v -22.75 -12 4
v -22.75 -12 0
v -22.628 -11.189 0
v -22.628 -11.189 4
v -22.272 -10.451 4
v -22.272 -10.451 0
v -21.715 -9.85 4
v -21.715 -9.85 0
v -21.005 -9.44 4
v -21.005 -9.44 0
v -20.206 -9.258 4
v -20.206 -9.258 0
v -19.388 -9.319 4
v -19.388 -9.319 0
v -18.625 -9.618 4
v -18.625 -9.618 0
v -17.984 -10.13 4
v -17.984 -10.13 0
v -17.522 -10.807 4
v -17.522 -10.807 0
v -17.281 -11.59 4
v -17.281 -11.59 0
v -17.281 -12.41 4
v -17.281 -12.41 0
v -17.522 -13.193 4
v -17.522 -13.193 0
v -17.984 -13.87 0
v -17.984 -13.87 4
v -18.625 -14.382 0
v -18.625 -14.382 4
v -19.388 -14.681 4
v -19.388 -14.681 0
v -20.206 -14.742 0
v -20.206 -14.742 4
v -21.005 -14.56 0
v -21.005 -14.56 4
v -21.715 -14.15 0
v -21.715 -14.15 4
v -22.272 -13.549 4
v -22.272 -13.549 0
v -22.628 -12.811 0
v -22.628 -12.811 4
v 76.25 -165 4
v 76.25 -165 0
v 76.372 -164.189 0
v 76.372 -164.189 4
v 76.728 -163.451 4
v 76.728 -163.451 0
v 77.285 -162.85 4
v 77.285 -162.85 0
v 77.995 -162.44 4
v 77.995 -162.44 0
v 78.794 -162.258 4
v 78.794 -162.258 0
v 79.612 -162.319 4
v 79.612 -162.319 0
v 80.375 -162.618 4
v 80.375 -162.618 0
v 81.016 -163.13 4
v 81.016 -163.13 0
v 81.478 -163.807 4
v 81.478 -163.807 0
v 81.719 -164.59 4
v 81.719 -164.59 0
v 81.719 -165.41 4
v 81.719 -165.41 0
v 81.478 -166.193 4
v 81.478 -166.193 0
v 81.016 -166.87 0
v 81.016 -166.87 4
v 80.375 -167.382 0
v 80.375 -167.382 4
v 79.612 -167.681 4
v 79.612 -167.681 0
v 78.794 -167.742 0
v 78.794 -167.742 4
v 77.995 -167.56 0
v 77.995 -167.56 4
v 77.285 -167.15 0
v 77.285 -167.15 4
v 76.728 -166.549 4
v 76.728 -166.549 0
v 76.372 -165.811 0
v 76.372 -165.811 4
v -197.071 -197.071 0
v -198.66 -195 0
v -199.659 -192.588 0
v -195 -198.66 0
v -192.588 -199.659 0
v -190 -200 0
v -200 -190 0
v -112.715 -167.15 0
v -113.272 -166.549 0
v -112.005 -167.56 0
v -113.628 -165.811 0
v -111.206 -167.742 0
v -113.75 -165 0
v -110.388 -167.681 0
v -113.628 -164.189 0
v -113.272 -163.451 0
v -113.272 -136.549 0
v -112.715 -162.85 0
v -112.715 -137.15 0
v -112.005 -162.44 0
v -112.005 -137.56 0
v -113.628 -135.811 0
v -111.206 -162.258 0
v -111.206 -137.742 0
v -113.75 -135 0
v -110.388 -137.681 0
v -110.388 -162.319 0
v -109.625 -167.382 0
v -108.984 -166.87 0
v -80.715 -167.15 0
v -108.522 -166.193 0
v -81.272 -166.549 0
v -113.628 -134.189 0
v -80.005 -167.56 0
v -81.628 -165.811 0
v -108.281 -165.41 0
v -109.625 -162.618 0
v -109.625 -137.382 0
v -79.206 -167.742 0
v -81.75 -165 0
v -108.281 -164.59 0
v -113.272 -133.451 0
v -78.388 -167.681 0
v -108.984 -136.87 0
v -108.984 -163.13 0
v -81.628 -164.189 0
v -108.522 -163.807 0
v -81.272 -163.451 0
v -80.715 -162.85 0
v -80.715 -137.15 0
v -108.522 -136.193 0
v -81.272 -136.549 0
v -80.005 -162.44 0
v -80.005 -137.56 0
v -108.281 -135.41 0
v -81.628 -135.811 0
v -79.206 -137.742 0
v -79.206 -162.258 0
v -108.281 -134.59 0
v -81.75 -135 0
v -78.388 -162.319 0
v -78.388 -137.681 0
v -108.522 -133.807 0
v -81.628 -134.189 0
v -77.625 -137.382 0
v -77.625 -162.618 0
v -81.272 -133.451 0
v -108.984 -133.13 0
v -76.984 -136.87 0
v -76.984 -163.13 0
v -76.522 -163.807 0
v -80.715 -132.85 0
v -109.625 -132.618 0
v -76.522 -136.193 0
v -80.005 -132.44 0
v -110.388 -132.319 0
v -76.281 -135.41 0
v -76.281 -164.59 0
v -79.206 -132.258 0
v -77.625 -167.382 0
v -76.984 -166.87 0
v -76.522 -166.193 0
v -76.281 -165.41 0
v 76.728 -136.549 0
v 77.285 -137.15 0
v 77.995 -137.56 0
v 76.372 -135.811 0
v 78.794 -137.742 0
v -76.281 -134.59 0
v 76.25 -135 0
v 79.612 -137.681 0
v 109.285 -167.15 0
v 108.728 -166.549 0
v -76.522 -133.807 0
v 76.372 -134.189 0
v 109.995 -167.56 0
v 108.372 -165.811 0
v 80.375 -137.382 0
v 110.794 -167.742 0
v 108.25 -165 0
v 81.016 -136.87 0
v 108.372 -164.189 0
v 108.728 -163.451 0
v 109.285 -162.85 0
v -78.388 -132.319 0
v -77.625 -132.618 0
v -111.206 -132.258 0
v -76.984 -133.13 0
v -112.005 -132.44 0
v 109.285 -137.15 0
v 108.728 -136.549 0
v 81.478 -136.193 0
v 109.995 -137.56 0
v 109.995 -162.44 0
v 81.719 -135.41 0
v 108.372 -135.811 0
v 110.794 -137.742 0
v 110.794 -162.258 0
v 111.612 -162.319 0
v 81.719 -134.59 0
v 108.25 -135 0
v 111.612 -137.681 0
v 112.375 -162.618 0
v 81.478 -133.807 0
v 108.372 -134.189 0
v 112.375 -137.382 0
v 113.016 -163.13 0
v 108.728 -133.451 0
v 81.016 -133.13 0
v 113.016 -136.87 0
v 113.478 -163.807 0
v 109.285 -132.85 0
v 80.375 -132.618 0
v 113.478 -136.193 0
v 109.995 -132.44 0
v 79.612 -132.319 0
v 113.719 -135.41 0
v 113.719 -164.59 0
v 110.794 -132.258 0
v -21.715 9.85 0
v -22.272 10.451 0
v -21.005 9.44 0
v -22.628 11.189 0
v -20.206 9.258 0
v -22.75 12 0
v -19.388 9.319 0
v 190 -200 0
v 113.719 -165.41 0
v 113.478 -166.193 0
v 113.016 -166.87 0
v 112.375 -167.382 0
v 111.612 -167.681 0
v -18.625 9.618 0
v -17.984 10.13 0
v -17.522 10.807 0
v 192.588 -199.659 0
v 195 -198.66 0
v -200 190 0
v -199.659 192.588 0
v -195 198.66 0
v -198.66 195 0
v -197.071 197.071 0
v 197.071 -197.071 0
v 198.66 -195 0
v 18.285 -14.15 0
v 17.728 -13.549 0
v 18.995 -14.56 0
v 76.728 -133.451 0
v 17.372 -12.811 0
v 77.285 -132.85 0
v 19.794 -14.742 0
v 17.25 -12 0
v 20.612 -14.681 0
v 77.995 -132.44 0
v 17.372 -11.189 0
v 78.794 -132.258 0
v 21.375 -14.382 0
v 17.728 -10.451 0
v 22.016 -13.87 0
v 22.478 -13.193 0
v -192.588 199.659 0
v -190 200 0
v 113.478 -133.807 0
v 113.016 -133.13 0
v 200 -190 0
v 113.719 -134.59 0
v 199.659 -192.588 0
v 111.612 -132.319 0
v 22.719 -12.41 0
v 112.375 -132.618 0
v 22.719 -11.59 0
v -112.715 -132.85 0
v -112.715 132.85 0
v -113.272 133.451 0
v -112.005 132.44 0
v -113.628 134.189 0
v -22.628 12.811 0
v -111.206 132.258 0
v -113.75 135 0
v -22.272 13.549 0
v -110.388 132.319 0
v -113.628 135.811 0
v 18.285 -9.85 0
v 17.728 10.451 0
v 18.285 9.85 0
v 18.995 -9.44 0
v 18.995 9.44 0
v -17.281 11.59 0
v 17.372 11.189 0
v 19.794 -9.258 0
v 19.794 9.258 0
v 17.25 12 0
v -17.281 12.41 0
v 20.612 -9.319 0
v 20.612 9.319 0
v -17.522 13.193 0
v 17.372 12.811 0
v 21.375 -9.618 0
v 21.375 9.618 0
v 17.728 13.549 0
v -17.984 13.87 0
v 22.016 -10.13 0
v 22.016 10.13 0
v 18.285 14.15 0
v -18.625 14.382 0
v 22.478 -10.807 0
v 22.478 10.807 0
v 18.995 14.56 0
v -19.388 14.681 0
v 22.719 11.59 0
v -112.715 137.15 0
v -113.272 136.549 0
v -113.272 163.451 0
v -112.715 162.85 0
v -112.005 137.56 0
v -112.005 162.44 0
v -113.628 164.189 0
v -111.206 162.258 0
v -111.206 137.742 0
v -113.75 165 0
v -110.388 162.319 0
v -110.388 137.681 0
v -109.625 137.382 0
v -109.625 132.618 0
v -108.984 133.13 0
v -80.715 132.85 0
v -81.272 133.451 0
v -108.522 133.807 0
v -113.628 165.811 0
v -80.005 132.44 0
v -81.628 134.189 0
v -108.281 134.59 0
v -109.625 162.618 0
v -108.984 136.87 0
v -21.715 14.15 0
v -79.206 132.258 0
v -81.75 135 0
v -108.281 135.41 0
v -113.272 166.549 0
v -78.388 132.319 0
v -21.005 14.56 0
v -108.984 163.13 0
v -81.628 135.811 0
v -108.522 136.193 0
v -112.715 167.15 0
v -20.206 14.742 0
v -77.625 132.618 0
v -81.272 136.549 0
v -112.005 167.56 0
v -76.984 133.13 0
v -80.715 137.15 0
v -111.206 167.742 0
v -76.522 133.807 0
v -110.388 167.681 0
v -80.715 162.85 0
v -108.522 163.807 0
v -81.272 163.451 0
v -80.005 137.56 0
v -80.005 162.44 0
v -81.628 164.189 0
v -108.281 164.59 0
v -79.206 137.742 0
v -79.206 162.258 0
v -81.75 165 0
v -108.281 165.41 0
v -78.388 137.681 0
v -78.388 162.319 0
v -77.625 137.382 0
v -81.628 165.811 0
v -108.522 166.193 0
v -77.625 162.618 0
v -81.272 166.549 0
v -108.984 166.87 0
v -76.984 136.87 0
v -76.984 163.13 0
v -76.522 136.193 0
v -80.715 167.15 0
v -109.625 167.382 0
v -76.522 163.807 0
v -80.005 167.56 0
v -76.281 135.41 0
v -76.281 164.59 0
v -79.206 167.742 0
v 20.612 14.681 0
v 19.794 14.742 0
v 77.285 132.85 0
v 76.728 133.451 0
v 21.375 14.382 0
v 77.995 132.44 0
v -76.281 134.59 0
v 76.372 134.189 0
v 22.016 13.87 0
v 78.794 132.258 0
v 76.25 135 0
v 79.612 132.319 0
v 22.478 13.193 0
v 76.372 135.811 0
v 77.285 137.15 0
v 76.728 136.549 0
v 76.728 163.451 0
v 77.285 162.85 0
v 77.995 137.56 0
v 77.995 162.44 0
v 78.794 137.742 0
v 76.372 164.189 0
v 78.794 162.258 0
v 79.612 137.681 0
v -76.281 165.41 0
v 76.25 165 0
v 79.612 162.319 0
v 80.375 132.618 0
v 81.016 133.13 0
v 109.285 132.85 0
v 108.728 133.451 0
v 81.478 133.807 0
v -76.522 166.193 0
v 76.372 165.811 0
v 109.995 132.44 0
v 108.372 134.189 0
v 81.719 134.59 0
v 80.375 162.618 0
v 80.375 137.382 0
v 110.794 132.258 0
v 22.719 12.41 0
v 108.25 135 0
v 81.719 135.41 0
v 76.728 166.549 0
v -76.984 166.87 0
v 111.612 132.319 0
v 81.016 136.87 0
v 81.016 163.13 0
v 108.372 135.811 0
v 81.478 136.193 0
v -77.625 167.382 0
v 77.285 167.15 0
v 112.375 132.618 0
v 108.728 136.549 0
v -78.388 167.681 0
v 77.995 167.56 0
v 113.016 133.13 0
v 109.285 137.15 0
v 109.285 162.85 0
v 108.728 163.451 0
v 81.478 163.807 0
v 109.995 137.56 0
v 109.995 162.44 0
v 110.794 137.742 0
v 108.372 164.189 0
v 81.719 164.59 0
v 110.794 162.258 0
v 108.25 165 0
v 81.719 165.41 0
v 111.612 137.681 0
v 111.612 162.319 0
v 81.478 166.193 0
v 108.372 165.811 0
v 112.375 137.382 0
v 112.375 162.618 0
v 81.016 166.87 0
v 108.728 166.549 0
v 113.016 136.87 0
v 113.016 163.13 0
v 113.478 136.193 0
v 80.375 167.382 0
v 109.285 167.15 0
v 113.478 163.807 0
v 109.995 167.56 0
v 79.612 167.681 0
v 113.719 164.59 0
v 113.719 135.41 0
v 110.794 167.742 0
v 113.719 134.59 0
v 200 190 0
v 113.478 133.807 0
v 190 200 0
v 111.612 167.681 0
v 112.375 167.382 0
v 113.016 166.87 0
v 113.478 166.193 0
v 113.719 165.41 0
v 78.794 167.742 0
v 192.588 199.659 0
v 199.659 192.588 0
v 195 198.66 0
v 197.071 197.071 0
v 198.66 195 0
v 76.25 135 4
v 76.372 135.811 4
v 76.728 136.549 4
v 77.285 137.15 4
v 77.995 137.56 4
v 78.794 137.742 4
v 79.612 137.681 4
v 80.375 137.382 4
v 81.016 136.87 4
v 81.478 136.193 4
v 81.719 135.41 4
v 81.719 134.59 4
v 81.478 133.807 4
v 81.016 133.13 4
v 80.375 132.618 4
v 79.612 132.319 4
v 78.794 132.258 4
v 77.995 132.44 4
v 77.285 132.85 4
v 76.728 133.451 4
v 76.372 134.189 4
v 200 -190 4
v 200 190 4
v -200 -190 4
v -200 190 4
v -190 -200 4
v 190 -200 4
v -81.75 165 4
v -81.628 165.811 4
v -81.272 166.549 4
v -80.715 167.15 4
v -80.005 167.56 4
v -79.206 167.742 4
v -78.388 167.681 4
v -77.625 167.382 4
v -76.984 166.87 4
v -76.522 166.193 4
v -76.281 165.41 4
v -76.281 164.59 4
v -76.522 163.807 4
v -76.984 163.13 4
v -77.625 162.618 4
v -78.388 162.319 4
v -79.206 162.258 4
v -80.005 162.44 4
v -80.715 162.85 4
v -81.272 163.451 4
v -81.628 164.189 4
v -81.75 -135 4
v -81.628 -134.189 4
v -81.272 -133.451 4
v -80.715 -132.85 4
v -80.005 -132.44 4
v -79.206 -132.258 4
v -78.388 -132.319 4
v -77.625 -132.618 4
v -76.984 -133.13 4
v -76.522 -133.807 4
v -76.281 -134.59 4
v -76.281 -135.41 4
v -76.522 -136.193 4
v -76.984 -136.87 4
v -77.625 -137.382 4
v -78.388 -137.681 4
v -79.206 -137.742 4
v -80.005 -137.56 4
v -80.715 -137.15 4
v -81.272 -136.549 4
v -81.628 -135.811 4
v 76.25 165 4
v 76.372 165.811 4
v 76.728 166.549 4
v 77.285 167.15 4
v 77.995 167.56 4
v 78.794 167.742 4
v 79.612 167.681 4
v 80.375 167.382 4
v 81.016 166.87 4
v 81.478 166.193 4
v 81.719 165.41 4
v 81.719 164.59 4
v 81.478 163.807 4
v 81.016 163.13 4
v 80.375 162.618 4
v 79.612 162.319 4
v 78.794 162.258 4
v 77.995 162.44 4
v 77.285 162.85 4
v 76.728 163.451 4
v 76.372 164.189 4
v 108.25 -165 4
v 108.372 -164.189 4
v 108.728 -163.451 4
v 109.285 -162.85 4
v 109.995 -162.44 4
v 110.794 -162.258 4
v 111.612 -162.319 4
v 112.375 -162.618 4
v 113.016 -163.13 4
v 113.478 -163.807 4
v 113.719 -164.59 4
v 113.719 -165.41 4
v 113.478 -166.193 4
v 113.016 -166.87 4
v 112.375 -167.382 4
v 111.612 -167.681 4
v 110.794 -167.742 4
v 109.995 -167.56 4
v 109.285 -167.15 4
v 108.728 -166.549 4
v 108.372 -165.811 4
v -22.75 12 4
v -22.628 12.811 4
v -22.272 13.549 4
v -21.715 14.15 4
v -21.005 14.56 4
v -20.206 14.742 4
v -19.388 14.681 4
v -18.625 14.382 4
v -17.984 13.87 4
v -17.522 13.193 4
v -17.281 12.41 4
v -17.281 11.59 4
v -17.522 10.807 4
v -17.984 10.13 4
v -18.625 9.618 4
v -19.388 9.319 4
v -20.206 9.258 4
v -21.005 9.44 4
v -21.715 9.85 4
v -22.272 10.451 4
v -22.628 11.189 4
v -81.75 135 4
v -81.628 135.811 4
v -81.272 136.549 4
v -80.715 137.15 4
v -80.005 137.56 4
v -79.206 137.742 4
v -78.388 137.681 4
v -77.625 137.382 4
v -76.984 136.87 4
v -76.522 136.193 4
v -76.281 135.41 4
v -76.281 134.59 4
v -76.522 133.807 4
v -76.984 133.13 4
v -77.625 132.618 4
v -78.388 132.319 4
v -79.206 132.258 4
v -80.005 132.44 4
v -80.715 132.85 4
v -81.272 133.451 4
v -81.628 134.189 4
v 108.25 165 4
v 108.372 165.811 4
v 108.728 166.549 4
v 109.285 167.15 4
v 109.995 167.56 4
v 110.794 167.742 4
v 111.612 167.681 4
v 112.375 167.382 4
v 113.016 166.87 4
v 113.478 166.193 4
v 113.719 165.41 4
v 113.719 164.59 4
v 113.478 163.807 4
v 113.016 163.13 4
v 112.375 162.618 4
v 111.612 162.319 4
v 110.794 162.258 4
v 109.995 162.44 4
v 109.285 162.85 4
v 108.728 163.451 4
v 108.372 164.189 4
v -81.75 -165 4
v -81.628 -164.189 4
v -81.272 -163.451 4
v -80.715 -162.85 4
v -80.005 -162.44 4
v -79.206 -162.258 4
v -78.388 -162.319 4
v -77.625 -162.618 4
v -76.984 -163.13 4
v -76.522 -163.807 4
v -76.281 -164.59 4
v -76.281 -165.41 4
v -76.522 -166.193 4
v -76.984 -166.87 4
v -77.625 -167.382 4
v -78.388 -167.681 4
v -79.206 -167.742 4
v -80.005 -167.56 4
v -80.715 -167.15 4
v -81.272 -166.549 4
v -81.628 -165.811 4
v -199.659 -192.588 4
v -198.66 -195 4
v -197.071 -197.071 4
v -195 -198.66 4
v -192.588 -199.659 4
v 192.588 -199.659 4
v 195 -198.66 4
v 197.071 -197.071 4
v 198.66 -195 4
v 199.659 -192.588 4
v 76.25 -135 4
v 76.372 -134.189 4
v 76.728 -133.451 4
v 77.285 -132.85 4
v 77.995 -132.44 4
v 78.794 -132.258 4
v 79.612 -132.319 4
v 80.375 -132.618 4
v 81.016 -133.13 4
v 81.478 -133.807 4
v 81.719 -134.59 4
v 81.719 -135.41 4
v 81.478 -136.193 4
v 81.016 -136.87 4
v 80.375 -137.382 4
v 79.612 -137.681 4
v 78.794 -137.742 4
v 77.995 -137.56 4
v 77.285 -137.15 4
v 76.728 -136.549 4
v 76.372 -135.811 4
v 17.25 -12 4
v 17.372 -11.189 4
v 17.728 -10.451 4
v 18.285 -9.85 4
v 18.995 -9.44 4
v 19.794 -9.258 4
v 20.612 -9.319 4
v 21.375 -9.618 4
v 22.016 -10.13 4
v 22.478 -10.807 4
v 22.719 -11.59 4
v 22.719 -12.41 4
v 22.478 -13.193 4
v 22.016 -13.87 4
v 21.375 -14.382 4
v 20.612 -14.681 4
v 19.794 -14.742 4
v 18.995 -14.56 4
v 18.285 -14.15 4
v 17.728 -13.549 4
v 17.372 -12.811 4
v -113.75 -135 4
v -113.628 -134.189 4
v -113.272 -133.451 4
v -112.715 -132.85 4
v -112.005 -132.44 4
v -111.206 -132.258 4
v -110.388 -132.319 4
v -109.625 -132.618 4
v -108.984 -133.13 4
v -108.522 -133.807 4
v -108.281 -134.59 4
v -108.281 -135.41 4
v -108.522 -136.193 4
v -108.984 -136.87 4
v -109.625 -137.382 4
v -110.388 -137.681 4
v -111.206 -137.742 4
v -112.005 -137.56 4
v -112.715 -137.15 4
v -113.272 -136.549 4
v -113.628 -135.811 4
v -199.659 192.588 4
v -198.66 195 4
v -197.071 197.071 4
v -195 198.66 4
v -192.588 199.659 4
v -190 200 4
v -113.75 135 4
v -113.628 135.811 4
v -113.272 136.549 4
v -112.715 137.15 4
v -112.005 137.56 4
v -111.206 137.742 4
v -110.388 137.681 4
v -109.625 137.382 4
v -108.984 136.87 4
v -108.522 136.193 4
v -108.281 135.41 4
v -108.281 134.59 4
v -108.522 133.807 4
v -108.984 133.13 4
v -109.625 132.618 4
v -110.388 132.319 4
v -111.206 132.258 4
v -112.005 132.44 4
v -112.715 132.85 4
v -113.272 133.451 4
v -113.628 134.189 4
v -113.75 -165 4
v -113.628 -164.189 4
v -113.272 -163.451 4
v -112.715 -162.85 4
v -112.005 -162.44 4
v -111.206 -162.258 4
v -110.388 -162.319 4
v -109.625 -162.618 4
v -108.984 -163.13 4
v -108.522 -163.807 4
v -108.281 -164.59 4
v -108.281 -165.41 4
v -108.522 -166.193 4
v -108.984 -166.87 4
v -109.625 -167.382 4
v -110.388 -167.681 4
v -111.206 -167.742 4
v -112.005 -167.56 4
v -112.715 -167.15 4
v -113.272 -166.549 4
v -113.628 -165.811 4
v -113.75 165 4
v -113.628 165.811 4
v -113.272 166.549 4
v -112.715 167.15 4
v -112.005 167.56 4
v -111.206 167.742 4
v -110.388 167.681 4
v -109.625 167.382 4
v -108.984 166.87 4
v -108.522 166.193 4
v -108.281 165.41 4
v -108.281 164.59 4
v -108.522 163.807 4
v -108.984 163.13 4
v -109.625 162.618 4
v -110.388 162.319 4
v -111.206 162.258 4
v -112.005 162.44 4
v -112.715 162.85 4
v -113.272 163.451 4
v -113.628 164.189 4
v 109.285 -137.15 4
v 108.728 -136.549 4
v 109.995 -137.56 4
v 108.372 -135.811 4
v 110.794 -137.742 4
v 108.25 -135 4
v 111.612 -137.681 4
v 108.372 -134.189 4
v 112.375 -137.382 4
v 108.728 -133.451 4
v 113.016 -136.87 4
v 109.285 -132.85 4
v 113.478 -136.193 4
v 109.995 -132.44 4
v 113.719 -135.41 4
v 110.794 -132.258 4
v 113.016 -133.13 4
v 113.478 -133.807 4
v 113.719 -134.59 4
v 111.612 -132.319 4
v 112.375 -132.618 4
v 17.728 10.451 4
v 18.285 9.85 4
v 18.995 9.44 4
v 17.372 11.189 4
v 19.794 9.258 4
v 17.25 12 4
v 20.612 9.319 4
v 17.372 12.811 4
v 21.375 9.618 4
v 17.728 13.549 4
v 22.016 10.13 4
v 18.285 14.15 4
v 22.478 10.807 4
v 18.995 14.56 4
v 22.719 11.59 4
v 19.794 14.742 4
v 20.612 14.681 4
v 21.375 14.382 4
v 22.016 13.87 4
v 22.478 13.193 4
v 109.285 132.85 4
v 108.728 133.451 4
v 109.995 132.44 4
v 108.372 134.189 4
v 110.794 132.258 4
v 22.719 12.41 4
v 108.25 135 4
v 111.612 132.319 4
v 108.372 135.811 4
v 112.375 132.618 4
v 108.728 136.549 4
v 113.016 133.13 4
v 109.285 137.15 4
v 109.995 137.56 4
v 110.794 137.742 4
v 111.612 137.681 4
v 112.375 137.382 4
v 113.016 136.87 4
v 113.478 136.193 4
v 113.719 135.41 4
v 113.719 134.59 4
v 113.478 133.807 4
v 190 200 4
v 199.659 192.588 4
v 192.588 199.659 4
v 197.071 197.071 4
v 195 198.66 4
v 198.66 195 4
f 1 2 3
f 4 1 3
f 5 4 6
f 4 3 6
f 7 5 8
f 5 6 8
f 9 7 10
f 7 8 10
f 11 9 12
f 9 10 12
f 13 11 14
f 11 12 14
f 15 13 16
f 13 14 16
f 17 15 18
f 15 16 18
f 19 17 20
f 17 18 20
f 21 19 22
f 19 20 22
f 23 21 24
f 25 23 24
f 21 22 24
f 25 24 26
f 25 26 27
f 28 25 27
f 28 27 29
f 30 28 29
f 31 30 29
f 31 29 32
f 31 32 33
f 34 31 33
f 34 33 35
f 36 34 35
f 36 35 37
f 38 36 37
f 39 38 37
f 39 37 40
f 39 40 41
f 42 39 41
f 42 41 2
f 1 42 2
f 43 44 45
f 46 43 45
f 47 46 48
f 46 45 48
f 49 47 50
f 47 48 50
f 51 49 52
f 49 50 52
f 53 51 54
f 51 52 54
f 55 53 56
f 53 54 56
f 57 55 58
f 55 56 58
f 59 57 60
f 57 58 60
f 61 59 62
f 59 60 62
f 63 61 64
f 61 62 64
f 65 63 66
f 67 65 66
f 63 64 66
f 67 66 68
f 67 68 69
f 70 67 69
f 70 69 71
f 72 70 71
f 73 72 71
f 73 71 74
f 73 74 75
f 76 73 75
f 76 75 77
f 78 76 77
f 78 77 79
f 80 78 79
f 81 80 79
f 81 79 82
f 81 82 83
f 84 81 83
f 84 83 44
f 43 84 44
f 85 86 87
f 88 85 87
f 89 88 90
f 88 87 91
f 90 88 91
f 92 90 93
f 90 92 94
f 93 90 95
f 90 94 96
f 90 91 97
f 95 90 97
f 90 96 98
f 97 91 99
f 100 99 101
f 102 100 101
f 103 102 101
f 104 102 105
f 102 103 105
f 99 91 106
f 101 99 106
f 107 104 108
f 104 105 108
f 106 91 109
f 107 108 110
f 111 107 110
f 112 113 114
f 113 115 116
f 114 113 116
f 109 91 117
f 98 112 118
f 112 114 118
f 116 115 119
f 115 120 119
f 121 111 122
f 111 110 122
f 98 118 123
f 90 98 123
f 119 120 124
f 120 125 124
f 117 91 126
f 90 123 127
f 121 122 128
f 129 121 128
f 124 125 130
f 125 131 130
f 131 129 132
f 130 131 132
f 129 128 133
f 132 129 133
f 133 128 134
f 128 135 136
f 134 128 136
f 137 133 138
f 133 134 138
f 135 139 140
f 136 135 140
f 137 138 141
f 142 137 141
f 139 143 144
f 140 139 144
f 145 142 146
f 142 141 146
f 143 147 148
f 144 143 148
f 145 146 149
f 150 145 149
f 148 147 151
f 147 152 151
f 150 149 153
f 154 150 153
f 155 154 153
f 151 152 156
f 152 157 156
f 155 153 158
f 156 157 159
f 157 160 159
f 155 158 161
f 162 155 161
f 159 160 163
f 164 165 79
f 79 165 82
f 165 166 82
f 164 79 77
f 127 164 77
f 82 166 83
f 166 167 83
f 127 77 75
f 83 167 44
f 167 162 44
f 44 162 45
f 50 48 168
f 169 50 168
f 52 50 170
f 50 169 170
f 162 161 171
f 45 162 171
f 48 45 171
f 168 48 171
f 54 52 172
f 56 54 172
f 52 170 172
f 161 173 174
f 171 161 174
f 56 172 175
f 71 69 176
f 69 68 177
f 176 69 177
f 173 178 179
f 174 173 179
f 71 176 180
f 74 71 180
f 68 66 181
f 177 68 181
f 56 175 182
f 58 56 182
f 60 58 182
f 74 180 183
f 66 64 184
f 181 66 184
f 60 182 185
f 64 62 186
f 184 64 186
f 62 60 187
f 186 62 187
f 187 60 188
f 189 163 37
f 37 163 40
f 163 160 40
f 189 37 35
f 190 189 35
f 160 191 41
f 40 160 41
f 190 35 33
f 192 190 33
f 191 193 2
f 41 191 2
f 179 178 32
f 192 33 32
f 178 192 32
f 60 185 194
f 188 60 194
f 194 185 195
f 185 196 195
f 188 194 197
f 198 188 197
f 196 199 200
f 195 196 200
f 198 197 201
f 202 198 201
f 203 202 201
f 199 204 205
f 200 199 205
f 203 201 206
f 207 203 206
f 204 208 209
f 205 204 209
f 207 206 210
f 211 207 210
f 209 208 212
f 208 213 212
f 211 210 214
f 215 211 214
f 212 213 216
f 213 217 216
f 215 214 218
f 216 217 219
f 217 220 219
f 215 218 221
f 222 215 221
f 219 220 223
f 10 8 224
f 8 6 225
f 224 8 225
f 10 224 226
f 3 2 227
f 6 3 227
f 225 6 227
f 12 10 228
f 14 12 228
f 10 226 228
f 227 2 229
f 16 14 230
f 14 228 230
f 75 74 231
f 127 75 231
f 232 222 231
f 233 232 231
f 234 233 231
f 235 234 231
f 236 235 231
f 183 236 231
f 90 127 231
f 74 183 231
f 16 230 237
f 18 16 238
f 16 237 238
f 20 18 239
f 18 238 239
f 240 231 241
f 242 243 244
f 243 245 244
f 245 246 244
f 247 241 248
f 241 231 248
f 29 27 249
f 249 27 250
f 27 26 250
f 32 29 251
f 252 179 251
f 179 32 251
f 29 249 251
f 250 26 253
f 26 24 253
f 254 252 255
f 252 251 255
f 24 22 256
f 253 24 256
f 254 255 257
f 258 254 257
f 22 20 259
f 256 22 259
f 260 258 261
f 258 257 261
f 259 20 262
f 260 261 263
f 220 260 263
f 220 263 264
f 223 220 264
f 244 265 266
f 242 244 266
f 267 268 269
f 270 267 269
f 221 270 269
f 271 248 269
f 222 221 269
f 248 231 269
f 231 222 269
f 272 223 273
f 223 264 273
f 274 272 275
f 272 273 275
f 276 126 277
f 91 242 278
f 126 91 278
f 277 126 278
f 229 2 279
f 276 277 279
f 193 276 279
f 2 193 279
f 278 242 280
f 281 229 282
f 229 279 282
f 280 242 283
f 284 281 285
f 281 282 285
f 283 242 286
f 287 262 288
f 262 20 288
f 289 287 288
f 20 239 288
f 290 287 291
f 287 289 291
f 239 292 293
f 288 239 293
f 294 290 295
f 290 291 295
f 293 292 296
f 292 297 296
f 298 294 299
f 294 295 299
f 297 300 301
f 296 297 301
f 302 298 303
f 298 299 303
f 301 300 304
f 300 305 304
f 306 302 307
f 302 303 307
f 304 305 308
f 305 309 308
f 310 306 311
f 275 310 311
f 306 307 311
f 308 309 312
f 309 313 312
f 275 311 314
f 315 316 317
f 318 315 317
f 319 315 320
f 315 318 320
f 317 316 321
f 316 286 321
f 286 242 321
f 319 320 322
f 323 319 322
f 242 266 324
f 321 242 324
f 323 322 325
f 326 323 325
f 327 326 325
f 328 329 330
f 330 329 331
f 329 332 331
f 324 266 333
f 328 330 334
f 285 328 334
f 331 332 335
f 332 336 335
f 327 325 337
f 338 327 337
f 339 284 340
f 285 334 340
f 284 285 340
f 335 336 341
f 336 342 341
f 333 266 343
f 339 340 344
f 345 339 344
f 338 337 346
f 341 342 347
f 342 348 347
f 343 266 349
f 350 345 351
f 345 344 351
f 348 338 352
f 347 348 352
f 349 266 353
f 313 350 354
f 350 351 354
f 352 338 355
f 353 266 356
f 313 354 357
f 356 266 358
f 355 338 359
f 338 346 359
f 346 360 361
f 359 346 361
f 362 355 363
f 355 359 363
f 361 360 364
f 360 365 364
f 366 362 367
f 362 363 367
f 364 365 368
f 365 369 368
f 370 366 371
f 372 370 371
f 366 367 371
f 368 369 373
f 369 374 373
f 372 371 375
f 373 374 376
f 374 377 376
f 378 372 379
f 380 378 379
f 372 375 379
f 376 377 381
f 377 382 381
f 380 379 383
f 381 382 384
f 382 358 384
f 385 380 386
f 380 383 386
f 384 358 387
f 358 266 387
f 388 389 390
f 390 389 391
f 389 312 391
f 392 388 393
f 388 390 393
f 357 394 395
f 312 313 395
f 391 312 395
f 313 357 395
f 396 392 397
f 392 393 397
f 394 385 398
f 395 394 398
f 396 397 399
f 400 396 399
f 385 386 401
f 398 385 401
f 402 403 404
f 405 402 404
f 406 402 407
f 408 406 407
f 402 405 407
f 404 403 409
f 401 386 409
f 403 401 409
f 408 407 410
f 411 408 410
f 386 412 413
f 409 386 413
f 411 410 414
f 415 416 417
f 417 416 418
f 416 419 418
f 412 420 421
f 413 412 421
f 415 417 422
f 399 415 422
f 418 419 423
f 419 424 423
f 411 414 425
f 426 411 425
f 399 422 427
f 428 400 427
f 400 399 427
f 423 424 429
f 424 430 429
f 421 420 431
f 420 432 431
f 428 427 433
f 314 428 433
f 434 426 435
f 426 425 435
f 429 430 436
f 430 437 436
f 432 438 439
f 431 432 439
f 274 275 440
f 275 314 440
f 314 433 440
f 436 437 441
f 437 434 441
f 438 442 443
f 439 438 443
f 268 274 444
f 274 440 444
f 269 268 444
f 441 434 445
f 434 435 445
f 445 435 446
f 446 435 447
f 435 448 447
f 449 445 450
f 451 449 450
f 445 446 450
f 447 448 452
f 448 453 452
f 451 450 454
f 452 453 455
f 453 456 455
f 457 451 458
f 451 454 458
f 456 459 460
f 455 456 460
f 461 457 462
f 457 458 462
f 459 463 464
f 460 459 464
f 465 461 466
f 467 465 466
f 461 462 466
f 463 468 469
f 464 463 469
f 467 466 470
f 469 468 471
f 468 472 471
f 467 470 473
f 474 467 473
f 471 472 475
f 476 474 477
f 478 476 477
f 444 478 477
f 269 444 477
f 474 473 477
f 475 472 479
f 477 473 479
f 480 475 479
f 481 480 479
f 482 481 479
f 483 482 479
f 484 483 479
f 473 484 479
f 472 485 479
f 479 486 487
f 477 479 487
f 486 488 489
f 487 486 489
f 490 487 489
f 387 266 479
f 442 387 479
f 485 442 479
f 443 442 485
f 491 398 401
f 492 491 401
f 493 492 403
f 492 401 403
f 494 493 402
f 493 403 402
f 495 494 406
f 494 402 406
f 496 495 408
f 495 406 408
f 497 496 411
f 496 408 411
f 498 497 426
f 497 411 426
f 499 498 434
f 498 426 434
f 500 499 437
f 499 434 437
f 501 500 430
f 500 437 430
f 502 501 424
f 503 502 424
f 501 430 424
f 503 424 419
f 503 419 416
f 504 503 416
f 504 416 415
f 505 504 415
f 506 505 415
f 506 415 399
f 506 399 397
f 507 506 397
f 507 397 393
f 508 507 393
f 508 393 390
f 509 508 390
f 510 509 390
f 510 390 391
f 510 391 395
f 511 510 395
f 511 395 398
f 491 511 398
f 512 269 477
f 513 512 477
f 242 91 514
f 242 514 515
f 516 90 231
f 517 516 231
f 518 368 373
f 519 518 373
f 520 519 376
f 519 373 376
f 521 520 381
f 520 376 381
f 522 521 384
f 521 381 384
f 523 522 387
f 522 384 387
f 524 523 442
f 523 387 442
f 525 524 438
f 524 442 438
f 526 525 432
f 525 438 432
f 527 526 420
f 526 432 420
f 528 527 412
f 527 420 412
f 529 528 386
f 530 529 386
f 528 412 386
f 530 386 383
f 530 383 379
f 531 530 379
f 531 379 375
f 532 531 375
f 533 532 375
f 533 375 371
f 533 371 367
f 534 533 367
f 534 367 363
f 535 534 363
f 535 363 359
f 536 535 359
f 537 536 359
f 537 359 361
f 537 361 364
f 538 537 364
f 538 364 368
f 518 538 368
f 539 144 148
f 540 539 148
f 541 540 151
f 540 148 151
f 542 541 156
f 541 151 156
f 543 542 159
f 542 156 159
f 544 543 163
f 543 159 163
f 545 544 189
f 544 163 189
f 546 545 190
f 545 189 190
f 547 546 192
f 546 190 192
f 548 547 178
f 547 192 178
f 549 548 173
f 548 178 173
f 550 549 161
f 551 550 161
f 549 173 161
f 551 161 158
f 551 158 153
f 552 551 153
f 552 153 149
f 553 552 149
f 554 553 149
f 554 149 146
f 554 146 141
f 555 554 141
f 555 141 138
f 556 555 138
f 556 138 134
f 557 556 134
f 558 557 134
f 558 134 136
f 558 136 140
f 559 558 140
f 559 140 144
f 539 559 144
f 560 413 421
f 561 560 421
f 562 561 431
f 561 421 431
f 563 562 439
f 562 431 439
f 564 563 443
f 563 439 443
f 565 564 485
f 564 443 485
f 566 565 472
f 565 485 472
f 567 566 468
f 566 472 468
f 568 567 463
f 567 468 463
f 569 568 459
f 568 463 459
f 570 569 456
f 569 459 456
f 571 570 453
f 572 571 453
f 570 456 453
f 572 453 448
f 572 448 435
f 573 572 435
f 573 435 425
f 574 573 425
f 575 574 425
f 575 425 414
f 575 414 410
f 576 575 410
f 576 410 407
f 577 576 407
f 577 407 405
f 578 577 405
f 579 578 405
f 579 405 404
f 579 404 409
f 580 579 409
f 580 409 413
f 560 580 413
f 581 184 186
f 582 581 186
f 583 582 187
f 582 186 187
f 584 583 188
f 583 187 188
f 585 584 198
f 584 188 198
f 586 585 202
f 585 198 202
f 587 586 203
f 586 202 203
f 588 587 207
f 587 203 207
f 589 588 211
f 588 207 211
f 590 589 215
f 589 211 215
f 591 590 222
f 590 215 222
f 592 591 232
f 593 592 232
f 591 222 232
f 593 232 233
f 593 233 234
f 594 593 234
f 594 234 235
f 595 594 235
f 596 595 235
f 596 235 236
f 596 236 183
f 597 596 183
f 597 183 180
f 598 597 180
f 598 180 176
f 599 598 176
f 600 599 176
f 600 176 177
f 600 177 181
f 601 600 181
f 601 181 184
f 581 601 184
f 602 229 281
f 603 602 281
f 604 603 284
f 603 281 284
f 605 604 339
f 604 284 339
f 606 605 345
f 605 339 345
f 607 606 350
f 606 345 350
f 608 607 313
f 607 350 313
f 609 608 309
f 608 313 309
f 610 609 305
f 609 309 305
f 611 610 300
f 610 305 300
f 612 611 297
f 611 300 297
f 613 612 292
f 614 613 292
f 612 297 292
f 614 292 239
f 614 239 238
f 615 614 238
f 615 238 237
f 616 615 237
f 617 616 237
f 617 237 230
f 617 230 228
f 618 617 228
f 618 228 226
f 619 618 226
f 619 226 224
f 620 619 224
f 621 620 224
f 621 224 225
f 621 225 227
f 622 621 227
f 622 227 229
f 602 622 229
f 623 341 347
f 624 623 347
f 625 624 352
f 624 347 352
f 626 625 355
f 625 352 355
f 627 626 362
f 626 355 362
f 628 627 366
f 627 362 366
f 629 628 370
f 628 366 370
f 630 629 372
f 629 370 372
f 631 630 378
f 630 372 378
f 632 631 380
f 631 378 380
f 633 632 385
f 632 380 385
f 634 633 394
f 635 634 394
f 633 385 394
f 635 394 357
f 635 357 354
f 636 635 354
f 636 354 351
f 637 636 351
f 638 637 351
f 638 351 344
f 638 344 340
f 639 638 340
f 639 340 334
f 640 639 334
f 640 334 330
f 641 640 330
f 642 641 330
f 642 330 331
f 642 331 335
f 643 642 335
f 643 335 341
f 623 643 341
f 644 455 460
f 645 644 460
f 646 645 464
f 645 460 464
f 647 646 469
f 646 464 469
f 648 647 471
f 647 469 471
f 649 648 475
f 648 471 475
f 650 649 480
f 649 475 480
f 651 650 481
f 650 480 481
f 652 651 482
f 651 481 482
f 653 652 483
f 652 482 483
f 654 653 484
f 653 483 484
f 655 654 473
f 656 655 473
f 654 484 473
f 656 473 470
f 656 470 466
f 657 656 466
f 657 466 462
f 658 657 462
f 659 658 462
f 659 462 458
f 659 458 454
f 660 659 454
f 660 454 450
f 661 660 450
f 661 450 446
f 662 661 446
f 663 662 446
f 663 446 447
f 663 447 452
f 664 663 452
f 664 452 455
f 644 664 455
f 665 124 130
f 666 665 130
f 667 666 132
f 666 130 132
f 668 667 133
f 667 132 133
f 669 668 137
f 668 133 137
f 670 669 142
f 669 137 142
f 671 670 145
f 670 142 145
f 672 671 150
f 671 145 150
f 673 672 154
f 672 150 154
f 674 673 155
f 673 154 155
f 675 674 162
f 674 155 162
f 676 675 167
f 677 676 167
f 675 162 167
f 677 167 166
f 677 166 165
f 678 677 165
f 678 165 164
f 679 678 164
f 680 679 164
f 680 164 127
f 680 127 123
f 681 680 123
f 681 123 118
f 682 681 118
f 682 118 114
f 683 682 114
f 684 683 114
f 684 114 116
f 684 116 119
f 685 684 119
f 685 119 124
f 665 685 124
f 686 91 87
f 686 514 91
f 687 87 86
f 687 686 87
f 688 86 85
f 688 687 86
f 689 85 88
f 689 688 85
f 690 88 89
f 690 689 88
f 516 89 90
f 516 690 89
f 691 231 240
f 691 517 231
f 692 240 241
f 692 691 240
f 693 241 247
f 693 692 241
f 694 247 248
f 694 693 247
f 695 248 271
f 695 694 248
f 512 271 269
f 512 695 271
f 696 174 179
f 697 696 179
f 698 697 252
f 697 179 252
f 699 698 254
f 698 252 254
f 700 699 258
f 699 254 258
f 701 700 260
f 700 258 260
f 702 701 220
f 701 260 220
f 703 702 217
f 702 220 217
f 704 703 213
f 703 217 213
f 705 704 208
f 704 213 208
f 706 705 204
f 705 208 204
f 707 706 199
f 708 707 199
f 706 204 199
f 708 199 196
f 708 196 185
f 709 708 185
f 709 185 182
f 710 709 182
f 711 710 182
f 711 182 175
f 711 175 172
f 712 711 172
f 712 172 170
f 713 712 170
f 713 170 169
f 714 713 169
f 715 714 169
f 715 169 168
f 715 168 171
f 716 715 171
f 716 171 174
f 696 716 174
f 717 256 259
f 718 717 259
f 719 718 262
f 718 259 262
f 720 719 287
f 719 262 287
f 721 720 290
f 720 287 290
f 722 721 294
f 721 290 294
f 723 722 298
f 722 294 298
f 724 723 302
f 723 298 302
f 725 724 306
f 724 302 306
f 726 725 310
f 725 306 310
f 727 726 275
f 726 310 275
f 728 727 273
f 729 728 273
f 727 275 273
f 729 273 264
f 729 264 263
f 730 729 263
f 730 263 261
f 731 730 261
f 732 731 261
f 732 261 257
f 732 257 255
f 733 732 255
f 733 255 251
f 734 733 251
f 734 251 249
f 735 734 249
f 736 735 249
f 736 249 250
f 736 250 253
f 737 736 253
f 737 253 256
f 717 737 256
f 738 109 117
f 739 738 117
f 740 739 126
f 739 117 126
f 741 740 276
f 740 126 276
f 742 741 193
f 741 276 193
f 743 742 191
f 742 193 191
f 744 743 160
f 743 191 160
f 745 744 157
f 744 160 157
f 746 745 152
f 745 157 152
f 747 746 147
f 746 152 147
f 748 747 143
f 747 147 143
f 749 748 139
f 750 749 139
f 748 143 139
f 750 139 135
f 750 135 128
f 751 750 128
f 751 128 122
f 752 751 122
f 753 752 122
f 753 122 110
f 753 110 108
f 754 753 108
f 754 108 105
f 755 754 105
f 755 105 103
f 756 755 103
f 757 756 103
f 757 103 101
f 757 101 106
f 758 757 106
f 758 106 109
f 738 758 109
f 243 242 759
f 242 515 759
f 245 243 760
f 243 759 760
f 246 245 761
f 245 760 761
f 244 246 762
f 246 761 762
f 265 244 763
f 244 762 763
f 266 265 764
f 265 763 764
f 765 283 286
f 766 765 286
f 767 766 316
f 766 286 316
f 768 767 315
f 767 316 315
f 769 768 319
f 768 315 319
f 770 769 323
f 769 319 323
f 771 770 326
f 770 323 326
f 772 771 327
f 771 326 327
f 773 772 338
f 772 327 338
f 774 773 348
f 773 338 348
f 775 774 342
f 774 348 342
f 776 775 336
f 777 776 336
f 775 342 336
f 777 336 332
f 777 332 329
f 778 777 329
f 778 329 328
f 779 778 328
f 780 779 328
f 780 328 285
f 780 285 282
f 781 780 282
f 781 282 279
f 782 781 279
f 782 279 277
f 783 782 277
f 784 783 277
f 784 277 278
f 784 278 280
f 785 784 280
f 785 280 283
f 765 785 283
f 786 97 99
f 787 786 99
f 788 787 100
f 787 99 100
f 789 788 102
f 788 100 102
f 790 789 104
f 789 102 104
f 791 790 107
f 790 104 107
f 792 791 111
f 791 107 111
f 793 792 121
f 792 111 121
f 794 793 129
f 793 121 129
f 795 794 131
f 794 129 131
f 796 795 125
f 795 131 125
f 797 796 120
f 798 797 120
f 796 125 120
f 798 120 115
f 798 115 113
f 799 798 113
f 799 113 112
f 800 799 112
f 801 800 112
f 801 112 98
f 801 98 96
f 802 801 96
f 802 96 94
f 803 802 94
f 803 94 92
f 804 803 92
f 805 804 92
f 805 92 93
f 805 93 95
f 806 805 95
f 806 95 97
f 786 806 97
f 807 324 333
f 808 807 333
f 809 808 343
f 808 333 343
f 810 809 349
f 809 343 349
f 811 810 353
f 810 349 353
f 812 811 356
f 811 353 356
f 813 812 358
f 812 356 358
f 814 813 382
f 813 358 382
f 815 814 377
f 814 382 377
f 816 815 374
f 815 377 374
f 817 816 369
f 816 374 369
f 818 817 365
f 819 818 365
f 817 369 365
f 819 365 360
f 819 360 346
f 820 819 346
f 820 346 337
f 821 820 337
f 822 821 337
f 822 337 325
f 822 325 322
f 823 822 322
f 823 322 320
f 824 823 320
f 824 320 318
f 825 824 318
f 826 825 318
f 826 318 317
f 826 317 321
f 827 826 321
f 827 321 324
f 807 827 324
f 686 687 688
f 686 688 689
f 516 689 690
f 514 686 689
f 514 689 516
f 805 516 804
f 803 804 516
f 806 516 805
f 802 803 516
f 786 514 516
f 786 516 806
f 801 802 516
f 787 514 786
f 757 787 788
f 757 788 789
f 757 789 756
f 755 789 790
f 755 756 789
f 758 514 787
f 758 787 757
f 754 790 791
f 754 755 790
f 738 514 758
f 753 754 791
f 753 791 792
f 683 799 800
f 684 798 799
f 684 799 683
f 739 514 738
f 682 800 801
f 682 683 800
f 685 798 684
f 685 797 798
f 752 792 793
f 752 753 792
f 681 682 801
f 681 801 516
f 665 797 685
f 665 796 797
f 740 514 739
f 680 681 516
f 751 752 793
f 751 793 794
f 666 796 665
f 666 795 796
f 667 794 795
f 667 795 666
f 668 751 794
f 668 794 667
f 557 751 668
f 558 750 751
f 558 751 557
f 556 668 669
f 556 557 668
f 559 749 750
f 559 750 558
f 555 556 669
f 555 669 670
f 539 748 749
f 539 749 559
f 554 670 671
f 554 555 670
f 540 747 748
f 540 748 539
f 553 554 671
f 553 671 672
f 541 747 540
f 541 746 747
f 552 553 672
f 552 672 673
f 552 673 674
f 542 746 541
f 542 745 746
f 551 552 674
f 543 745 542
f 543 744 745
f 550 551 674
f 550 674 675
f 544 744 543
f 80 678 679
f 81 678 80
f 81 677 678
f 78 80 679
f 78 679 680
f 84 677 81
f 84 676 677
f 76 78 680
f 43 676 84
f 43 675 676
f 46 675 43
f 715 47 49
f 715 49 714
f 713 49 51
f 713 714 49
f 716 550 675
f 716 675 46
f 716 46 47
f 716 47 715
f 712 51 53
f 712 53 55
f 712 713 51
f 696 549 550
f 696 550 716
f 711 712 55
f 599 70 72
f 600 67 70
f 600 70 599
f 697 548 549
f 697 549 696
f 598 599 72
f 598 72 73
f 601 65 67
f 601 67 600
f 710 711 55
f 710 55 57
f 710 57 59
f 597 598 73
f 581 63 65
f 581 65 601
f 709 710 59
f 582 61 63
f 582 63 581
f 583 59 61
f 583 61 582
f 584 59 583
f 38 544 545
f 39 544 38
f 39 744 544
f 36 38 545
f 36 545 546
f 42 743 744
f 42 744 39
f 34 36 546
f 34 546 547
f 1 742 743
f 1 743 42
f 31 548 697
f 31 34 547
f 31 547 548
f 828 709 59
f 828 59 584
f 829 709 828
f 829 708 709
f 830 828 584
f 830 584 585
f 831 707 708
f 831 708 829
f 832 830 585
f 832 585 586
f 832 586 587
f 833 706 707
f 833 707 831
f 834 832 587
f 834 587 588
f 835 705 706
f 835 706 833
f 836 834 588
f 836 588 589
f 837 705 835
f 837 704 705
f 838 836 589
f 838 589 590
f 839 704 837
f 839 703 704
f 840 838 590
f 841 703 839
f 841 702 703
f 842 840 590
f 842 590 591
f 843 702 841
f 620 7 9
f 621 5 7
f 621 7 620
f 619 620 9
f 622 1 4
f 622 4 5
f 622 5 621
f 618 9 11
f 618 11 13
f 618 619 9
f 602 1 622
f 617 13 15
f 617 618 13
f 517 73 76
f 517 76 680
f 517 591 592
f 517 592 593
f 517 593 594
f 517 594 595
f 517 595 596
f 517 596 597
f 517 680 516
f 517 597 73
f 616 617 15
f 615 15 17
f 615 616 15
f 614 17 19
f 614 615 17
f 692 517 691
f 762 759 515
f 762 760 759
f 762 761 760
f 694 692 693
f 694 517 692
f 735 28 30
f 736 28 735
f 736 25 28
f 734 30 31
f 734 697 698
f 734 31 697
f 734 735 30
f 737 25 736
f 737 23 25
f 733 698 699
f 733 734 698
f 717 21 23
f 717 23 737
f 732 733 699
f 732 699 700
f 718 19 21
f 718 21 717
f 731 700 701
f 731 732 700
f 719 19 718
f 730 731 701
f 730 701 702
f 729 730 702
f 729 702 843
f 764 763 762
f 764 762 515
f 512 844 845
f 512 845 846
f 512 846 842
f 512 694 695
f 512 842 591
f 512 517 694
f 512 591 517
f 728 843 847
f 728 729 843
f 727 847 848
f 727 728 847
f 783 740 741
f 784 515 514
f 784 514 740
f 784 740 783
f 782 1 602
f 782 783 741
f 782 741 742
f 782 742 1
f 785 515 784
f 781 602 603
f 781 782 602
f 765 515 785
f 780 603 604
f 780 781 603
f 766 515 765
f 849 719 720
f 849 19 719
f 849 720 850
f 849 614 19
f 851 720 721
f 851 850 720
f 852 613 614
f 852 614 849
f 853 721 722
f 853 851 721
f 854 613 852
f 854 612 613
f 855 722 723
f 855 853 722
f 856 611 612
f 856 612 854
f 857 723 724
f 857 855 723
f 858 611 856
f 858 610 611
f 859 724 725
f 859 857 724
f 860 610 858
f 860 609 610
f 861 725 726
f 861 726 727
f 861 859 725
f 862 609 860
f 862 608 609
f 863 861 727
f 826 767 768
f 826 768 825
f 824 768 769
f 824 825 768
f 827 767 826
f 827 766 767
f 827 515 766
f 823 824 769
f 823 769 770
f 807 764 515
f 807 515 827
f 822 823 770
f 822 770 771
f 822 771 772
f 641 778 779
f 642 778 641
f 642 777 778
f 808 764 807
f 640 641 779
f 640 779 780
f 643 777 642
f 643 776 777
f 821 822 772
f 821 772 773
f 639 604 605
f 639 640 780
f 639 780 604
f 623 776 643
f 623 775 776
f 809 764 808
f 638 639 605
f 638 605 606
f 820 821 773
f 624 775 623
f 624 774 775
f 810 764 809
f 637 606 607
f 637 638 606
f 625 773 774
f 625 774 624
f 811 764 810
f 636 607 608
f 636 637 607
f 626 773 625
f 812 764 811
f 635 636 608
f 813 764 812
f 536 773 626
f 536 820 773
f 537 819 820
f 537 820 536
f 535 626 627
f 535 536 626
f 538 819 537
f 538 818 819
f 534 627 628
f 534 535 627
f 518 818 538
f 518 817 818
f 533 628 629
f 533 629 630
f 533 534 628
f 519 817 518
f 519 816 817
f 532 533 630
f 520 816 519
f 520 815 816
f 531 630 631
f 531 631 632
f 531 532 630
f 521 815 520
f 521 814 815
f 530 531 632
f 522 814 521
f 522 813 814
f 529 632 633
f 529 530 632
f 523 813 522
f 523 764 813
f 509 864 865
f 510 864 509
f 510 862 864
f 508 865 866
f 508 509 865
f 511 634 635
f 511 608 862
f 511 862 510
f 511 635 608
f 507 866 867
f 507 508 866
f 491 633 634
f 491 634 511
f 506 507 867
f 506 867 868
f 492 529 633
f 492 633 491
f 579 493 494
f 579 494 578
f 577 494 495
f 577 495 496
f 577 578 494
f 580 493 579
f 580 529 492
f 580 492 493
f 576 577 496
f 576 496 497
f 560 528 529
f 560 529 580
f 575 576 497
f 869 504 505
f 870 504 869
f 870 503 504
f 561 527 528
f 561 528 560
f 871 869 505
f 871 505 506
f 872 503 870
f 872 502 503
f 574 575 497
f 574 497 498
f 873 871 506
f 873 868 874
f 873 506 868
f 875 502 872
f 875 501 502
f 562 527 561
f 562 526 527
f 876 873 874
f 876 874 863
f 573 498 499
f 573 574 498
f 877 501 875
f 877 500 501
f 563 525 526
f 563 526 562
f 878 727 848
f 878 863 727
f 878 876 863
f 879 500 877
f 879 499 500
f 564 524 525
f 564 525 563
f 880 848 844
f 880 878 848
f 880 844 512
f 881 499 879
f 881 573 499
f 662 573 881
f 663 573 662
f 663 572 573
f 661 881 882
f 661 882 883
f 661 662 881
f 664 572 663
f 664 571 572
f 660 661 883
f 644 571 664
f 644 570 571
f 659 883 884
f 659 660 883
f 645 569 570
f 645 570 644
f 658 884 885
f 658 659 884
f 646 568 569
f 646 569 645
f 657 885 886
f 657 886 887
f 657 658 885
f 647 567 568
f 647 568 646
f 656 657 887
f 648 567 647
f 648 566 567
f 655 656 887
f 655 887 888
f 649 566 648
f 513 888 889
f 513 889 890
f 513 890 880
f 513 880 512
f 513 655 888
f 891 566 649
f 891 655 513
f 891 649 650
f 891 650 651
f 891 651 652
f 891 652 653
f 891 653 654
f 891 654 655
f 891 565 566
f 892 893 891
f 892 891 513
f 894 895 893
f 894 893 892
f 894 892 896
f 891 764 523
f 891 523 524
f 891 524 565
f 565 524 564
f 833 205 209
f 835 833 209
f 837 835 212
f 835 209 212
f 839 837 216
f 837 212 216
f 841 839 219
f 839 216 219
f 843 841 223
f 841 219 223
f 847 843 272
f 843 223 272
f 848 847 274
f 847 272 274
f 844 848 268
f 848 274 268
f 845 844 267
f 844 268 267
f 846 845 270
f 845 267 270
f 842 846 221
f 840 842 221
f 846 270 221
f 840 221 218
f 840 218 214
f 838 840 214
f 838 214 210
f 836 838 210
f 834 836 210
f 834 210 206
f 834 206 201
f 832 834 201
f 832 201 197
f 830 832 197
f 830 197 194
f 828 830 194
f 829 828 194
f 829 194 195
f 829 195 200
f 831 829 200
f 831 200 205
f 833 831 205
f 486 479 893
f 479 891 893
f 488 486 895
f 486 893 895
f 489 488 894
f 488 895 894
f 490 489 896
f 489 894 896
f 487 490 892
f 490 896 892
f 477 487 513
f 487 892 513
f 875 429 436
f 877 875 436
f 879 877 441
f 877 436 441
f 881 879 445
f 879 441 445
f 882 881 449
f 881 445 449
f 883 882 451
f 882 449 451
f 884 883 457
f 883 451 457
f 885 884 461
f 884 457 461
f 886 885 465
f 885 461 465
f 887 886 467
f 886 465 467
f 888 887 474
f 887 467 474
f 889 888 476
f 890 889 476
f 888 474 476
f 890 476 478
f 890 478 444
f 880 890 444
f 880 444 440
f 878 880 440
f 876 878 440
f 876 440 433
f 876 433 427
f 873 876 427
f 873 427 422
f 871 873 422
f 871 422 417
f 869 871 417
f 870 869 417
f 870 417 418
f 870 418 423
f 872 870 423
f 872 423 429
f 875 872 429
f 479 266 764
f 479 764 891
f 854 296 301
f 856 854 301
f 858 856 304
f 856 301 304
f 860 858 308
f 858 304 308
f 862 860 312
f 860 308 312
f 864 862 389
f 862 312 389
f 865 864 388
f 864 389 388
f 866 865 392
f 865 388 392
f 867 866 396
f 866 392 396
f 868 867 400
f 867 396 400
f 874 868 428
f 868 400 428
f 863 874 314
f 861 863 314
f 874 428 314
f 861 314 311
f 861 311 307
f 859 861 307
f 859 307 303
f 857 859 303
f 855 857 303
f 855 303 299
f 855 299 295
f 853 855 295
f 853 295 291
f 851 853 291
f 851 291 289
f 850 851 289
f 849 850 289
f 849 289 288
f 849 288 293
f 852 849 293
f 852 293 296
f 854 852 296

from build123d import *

# Parameters (mm, degrees)
SKETCH_1_W                  = 400
SKETCH_1_H                  = 400
EXTRUDE_1_DEPTH             = 4
HOLE_WIZARD_5_5_5_5_1_D     = 5.5
PATTERN_LINEAR_1_COUNT      = 2
PATTERN_LINEAR_1_PITCH      = 300
PATTERN_LINEAR_1_COUNT_DIR2 = 2
PATTERN_LINEAR_1_PITCH_DIR2 = 190
HOLE_WIZARD_5_5_5_5_2_D     = 5.5
FILLET_1_R                  = 10


with BuildPart() as part:
    # Эскиз1 → Бобышка-Вытянуть1 (new body)
    with BuildSketch(Plane.XY):
        Rectangle(SKETCH_1_W, SKETCH_1_H)
    extrude(amount=EXTRUDE_1_DEPTH)

    # Диаметр отверстия Ø5.5 (5.5)1 (through all)
    with Locations(Plane.XY.offset(4)):
        with Locations((79, 165), (79, 135), (111, 135), (111, 165)):
            hole_wizard_5_5_5_5_1 = Hole(HOLE_WIZARD_5_5_5_5_1_D / 2)

    # Линейный массив1: Hole Wizard 5.5 _5.5_1 2 × 2
    with Locations(*[(-j * PATTERN_LINEAR_1_PITCH_DIR2, -i * PATTERN_LINEAR_1_PITCH, 0) for i in range(PATTERN_LINEAR_1_COUNT) for j in range(PATTERN_LINEAR_1_COUNT_DIR2) if (i, j) != (0, 0)]):
        add(hole_wizard_5_5_5_5_1, mode=Mode.SUBTRACT)

    # Диаметр отверстия Ø5.5 (5.5)2 (through all)
    with Locations(Plane.XY.offset(4)):
        with Locations((20, 12), (-20, 12), (-20, -12), (20, -12)):
            Hole(HOLE_WIZARD_5_5_5_5_2_D / 2)

    # Скругление1
    fillet_1_edges = [part.edges().sort_by_distance(p)[0] for p in [
        (200, -200, 2),
        (-200, -200, 2),
        (-200, 200, 2),
        (200, 200, 2),
    ]]
    fillet(fillet_1_edges, radius=FILLET_1_R)


solid = part.part
